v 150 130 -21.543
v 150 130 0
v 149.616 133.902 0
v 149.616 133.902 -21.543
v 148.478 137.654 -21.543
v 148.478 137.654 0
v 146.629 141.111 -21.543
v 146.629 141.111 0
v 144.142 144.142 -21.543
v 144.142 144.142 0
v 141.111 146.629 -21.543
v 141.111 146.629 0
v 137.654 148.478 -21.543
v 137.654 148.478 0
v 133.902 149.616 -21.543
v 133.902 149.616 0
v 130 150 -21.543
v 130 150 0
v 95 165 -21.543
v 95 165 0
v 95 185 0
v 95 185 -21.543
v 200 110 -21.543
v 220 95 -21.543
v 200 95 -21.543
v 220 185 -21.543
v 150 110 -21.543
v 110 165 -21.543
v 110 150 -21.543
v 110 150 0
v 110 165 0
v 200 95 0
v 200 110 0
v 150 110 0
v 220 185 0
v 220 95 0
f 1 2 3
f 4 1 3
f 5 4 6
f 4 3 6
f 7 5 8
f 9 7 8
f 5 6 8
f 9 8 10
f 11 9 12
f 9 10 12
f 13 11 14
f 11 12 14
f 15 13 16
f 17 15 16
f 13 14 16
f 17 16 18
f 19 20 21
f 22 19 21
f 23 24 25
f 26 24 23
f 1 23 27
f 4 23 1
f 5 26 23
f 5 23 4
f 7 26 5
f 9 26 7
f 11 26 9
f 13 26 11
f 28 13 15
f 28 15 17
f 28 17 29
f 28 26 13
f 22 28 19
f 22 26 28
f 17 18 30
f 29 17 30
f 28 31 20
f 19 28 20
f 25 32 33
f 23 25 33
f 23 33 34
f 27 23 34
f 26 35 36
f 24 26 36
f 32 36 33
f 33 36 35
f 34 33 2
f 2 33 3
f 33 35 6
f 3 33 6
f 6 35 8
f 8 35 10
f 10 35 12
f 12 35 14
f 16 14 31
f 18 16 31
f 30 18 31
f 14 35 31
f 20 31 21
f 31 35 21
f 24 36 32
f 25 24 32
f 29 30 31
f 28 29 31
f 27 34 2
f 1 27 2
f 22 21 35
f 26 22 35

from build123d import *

# Parameters (mm, degrees)
BOSS_EXTRUDE1_DEPTH = 21.542835


with BuildPart() as part:
    # Sketch1 → Boss-Extrude1 (new body)
    with BuildSketch(Plane.XY):
        with BuildLine():
            Line((150, 110), (150, 130))
            ThreePointArc((150, 130), (144.142135624, 144.142135624), (130, 150))
            Line((130, 150), (110, 150))
            Line((110, 150), (110, 165))
            Line((110, 165), (95, 165))
            Line((95, 165), (95, 185))
            Line((95, 185), (220, 185))
            Line((220, 185), (220, 95))
            Line((220, 95), (200, 95))
            Line((200, 95), (200, 110))
            Line((200, 110), (150, 110))
        make_face()
    extrude(amount=-BOSS_EXTRUDE1_DEPTH)


solid = part.part
